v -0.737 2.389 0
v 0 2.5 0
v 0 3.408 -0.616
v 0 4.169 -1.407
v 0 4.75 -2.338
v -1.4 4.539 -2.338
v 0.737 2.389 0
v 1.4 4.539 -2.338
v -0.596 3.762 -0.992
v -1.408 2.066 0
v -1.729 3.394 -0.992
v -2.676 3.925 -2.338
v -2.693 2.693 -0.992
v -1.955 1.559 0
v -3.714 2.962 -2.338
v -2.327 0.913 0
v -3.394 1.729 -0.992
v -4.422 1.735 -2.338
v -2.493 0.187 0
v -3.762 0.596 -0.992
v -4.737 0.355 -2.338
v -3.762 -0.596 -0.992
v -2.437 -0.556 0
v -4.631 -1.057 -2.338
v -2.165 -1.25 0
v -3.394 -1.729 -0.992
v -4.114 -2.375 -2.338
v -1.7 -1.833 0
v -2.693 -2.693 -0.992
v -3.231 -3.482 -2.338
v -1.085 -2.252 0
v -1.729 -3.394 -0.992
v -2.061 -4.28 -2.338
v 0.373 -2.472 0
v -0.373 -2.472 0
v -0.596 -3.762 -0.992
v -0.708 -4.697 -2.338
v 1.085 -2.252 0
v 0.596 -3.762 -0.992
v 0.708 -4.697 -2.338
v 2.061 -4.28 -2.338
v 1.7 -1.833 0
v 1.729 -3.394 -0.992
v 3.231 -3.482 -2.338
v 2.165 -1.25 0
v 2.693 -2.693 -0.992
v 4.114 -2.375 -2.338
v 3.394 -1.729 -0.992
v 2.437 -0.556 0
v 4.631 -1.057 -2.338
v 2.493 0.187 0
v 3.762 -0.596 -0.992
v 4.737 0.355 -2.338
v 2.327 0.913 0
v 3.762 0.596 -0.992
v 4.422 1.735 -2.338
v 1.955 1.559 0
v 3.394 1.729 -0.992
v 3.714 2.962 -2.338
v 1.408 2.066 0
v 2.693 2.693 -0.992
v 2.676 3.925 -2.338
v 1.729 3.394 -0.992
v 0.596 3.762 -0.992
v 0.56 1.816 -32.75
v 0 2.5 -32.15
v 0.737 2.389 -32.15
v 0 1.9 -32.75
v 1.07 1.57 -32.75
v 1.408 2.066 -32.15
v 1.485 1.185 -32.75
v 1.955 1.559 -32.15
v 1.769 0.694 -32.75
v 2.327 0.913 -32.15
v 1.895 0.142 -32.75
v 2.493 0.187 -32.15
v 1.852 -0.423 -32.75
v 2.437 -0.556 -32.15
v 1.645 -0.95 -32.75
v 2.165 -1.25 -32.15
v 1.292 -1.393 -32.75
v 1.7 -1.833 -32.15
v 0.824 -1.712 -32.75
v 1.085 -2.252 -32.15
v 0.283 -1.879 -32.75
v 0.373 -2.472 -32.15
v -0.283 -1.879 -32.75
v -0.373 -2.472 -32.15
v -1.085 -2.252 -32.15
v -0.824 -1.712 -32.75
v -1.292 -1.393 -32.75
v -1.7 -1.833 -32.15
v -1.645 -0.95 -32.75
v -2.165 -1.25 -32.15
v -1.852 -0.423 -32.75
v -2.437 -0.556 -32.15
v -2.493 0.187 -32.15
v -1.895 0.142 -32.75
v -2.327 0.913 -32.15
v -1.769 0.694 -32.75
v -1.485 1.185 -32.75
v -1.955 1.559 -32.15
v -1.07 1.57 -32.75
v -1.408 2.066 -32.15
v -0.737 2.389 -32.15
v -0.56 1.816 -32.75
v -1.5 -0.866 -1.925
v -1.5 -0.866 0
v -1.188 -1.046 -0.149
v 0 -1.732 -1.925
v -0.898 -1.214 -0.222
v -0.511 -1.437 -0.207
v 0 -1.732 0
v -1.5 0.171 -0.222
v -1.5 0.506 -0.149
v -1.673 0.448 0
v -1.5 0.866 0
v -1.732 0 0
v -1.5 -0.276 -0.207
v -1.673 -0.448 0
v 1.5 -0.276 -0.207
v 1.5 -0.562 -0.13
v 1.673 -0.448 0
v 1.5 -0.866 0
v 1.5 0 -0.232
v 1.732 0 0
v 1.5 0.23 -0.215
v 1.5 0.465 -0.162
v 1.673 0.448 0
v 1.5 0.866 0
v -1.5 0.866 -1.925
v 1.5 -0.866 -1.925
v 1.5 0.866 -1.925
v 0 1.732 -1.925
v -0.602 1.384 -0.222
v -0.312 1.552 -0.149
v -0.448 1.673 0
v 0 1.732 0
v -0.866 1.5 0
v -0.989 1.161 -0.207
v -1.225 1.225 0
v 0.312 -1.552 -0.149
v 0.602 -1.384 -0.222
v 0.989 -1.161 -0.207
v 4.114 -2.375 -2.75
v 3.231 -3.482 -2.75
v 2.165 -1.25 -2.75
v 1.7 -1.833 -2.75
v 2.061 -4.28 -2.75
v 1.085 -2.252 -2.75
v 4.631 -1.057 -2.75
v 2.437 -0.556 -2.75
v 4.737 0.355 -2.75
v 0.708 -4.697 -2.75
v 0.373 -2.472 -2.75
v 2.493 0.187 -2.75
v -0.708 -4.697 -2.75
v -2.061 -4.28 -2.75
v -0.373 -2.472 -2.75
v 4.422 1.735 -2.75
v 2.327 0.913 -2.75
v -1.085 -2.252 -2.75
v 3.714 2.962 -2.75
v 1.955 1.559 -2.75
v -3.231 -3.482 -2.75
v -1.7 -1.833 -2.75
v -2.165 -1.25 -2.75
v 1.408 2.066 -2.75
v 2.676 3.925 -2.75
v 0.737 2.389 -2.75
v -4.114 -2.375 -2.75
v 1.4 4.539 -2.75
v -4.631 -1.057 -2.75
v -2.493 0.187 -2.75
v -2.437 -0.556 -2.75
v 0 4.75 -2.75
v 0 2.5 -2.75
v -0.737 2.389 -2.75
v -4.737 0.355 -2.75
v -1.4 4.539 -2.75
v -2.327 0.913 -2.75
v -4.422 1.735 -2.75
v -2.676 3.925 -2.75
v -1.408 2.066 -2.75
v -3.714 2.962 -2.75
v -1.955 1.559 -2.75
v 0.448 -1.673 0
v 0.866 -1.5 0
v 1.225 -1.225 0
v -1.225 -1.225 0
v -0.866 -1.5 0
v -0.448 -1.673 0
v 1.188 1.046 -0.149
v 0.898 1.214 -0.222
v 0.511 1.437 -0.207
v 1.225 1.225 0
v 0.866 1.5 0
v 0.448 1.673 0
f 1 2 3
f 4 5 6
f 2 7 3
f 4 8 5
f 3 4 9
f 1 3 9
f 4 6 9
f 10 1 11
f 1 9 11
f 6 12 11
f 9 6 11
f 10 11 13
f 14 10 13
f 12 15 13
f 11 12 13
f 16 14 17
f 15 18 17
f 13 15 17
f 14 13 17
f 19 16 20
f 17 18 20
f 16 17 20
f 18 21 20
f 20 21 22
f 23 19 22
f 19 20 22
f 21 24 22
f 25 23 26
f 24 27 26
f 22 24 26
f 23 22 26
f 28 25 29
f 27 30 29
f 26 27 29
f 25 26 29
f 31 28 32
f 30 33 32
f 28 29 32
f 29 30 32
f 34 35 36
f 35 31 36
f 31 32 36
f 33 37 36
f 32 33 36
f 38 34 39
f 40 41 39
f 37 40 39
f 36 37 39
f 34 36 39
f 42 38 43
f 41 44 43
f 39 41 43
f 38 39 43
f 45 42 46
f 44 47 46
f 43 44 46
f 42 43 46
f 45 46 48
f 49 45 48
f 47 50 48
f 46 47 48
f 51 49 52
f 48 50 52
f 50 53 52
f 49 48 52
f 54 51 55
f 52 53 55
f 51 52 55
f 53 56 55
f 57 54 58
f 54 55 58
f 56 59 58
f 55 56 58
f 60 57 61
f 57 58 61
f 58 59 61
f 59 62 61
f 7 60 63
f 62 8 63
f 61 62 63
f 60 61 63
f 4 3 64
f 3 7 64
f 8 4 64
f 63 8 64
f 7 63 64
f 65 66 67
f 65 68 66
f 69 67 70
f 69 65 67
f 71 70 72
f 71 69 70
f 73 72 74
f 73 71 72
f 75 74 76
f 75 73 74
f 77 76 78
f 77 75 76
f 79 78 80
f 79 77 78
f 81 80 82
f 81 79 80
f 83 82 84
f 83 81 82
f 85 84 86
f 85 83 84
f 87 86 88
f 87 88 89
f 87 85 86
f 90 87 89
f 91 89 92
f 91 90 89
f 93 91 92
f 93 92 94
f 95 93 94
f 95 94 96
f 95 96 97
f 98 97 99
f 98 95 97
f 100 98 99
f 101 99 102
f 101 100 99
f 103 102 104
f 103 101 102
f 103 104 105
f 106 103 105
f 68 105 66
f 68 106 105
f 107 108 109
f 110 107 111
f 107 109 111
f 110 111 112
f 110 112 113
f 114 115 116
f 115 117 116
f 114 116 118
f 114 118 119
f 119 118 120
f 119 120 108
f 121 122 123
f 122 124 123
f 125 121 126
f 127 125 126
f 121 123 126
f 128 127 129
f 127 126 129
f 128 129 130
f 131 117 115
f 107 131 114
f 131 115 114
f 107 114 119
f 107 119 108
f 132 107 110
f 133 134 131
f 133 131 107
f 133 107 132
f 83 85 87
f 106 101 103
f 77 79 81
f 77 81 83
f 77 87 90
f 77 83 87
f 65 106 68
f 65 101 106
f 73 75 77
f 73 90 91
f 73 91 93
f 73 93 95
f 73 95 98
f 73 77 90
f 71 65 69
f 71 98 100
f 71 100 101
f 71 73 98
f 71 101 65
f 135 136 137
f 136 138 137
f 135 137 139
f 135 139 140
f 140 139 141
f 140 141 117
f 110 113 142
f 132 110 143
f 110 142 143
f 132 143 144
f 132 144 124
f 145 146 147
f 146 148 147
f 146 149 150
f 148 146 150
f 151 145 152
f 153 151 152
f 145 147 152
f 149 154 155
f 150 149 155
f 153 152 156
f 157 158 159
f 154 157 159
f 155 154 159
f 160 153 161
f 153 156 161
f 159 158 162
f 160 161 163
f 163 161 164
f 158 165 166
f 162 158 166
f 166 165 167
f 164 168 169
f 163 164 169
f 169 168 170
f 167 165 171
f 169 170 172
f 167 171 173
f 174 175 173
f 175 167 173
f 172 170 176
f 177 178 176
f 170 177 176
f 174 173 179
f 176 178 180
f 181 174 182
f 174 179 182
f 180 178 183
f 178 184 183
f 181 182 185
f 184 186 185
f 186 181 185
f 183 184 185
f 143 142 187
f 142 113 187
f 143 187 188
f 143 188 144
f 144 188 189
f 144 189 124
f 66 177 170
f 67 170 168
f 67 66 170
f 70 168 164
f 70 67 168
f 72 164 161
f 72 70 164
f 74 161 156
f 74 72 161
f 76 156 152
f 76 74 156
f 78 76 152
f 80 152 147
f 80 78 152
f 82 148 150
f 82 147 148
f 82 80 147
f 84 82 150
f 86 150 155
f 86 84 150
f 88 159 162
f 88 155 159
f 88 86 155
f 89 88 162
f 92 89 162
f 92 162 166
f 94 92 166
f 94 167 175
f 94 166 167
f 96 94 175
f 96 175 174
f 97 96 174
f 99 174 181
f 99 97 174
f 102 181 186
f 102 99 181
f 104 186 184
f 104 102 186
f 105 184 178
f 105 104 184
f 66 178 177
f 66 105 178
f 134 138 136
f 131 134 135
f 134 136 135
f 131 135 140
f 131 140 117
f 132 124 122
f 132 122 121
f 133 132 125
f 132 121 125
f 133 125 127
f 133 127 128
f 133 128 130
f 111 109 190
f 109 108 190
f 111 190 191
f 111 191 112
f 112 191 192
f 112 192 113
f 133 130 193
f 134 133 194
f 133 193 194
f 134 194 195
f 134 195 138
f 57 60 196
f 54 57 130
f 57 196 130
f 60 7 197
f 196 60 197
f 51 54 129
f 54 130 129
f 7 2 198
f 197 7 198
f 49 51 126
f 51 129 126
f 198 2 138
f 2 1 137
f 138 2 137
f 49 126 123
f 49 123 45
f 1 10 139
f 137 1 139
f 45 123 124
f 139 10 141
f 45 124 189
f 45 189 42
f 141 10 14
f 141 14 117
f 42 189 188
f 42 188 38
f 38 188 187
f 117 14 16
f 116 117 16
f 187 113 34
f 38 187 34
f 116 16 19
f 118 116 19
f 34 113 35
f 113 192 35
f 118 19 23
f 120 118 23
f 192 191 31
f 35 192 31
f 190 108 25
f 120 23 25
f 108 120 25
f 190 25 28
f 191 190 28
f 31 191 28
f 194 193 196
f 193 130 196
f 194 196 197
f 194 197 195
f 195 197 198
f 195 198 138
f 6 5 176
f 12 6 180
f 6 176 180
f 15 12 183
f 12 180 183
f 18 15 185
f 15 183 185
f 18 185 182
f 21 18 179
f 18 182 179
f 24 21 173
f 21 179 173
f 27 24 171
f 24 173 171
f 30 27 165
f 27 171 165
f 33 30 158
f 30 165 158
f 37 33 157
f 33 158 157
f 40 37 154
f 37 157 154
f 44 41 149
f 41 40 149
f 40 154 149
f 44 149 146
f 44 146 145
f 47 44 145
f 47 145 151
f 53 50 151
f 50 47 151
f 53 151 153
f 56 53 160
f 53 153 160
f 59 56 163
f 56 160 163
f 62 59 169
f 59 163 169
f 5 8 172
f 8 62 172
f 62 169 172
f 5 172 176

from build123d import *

# Parameters (mm, degrees)
CUT_EXTRUDE2_DEPTH = 1.925


with BuildPart() as part:
    # Sketch10 → Revolve3 (revolve)
    with BuildSketch(Plane(origin=(0, 0, 0), x_dir=(0, 0, -1), z_dir=(1, 0, 0))):
        Polygon((32.15, 2.5), (32.75, 1.9), (32.75, 0), (2.75, 0), (2.75, 2.5), align=None)
    revolve(axis=Axis((0, 0, 0), (0, 0, -1)))

    # Sketch7 → Revolve2 (revolve)
    with BuildSketch(Plane(origin=(0, 0, 0), x_dir=(0, 0, -1), z_dir=(1, 0, 0))):
        with BuildLine():
            Line((2.3375, 4.75), (2.75, 4.75))
            Line((2.75, 4.75), (2.75, 0))
            Line((2.75, 0), (0, 0))
            Line((0, 0), (0, 2.5))
            ThreePointArc((0, 2.5), (0.991875183, 3.808753282), (2.3375, 4.75))
        make_face()
    revolve(axis=Axis((0, 0, 0), (0, 0, -1)))

    # Sketch5 → Cut-Extrude2 (cut)
    with BuildSketch(Plane.XY):
        Polygon((1.5, -0.866025404), (1.5, 0.866025404), (0, 1.732050808), (-1.5, 0.866025404), (-1.5, -0.866025404), (0, -1.732050808), align=None)
    extrude(amount=-CUT_EXTRUDE2_DEPTH, mode=Mode.SUBTRACT)

    # Cut-Extrude3 cone 1 section (through the dimple's axis) → Cut-Extrude3 (revolve, cut)
    with BuildSketch(Plane(origin=(0, 0, 0), x_dir=(0, -1, 0), z_dir=(1, 0, 0))):
        Polygon((0, 0), (1.732050808, 0), (0, 1.732050808), align=None)
    revolve(axis=Axis((0, 0, 0), (0, 0, -1)), mode=Mode.SUBTRACT)


solid = part.part
